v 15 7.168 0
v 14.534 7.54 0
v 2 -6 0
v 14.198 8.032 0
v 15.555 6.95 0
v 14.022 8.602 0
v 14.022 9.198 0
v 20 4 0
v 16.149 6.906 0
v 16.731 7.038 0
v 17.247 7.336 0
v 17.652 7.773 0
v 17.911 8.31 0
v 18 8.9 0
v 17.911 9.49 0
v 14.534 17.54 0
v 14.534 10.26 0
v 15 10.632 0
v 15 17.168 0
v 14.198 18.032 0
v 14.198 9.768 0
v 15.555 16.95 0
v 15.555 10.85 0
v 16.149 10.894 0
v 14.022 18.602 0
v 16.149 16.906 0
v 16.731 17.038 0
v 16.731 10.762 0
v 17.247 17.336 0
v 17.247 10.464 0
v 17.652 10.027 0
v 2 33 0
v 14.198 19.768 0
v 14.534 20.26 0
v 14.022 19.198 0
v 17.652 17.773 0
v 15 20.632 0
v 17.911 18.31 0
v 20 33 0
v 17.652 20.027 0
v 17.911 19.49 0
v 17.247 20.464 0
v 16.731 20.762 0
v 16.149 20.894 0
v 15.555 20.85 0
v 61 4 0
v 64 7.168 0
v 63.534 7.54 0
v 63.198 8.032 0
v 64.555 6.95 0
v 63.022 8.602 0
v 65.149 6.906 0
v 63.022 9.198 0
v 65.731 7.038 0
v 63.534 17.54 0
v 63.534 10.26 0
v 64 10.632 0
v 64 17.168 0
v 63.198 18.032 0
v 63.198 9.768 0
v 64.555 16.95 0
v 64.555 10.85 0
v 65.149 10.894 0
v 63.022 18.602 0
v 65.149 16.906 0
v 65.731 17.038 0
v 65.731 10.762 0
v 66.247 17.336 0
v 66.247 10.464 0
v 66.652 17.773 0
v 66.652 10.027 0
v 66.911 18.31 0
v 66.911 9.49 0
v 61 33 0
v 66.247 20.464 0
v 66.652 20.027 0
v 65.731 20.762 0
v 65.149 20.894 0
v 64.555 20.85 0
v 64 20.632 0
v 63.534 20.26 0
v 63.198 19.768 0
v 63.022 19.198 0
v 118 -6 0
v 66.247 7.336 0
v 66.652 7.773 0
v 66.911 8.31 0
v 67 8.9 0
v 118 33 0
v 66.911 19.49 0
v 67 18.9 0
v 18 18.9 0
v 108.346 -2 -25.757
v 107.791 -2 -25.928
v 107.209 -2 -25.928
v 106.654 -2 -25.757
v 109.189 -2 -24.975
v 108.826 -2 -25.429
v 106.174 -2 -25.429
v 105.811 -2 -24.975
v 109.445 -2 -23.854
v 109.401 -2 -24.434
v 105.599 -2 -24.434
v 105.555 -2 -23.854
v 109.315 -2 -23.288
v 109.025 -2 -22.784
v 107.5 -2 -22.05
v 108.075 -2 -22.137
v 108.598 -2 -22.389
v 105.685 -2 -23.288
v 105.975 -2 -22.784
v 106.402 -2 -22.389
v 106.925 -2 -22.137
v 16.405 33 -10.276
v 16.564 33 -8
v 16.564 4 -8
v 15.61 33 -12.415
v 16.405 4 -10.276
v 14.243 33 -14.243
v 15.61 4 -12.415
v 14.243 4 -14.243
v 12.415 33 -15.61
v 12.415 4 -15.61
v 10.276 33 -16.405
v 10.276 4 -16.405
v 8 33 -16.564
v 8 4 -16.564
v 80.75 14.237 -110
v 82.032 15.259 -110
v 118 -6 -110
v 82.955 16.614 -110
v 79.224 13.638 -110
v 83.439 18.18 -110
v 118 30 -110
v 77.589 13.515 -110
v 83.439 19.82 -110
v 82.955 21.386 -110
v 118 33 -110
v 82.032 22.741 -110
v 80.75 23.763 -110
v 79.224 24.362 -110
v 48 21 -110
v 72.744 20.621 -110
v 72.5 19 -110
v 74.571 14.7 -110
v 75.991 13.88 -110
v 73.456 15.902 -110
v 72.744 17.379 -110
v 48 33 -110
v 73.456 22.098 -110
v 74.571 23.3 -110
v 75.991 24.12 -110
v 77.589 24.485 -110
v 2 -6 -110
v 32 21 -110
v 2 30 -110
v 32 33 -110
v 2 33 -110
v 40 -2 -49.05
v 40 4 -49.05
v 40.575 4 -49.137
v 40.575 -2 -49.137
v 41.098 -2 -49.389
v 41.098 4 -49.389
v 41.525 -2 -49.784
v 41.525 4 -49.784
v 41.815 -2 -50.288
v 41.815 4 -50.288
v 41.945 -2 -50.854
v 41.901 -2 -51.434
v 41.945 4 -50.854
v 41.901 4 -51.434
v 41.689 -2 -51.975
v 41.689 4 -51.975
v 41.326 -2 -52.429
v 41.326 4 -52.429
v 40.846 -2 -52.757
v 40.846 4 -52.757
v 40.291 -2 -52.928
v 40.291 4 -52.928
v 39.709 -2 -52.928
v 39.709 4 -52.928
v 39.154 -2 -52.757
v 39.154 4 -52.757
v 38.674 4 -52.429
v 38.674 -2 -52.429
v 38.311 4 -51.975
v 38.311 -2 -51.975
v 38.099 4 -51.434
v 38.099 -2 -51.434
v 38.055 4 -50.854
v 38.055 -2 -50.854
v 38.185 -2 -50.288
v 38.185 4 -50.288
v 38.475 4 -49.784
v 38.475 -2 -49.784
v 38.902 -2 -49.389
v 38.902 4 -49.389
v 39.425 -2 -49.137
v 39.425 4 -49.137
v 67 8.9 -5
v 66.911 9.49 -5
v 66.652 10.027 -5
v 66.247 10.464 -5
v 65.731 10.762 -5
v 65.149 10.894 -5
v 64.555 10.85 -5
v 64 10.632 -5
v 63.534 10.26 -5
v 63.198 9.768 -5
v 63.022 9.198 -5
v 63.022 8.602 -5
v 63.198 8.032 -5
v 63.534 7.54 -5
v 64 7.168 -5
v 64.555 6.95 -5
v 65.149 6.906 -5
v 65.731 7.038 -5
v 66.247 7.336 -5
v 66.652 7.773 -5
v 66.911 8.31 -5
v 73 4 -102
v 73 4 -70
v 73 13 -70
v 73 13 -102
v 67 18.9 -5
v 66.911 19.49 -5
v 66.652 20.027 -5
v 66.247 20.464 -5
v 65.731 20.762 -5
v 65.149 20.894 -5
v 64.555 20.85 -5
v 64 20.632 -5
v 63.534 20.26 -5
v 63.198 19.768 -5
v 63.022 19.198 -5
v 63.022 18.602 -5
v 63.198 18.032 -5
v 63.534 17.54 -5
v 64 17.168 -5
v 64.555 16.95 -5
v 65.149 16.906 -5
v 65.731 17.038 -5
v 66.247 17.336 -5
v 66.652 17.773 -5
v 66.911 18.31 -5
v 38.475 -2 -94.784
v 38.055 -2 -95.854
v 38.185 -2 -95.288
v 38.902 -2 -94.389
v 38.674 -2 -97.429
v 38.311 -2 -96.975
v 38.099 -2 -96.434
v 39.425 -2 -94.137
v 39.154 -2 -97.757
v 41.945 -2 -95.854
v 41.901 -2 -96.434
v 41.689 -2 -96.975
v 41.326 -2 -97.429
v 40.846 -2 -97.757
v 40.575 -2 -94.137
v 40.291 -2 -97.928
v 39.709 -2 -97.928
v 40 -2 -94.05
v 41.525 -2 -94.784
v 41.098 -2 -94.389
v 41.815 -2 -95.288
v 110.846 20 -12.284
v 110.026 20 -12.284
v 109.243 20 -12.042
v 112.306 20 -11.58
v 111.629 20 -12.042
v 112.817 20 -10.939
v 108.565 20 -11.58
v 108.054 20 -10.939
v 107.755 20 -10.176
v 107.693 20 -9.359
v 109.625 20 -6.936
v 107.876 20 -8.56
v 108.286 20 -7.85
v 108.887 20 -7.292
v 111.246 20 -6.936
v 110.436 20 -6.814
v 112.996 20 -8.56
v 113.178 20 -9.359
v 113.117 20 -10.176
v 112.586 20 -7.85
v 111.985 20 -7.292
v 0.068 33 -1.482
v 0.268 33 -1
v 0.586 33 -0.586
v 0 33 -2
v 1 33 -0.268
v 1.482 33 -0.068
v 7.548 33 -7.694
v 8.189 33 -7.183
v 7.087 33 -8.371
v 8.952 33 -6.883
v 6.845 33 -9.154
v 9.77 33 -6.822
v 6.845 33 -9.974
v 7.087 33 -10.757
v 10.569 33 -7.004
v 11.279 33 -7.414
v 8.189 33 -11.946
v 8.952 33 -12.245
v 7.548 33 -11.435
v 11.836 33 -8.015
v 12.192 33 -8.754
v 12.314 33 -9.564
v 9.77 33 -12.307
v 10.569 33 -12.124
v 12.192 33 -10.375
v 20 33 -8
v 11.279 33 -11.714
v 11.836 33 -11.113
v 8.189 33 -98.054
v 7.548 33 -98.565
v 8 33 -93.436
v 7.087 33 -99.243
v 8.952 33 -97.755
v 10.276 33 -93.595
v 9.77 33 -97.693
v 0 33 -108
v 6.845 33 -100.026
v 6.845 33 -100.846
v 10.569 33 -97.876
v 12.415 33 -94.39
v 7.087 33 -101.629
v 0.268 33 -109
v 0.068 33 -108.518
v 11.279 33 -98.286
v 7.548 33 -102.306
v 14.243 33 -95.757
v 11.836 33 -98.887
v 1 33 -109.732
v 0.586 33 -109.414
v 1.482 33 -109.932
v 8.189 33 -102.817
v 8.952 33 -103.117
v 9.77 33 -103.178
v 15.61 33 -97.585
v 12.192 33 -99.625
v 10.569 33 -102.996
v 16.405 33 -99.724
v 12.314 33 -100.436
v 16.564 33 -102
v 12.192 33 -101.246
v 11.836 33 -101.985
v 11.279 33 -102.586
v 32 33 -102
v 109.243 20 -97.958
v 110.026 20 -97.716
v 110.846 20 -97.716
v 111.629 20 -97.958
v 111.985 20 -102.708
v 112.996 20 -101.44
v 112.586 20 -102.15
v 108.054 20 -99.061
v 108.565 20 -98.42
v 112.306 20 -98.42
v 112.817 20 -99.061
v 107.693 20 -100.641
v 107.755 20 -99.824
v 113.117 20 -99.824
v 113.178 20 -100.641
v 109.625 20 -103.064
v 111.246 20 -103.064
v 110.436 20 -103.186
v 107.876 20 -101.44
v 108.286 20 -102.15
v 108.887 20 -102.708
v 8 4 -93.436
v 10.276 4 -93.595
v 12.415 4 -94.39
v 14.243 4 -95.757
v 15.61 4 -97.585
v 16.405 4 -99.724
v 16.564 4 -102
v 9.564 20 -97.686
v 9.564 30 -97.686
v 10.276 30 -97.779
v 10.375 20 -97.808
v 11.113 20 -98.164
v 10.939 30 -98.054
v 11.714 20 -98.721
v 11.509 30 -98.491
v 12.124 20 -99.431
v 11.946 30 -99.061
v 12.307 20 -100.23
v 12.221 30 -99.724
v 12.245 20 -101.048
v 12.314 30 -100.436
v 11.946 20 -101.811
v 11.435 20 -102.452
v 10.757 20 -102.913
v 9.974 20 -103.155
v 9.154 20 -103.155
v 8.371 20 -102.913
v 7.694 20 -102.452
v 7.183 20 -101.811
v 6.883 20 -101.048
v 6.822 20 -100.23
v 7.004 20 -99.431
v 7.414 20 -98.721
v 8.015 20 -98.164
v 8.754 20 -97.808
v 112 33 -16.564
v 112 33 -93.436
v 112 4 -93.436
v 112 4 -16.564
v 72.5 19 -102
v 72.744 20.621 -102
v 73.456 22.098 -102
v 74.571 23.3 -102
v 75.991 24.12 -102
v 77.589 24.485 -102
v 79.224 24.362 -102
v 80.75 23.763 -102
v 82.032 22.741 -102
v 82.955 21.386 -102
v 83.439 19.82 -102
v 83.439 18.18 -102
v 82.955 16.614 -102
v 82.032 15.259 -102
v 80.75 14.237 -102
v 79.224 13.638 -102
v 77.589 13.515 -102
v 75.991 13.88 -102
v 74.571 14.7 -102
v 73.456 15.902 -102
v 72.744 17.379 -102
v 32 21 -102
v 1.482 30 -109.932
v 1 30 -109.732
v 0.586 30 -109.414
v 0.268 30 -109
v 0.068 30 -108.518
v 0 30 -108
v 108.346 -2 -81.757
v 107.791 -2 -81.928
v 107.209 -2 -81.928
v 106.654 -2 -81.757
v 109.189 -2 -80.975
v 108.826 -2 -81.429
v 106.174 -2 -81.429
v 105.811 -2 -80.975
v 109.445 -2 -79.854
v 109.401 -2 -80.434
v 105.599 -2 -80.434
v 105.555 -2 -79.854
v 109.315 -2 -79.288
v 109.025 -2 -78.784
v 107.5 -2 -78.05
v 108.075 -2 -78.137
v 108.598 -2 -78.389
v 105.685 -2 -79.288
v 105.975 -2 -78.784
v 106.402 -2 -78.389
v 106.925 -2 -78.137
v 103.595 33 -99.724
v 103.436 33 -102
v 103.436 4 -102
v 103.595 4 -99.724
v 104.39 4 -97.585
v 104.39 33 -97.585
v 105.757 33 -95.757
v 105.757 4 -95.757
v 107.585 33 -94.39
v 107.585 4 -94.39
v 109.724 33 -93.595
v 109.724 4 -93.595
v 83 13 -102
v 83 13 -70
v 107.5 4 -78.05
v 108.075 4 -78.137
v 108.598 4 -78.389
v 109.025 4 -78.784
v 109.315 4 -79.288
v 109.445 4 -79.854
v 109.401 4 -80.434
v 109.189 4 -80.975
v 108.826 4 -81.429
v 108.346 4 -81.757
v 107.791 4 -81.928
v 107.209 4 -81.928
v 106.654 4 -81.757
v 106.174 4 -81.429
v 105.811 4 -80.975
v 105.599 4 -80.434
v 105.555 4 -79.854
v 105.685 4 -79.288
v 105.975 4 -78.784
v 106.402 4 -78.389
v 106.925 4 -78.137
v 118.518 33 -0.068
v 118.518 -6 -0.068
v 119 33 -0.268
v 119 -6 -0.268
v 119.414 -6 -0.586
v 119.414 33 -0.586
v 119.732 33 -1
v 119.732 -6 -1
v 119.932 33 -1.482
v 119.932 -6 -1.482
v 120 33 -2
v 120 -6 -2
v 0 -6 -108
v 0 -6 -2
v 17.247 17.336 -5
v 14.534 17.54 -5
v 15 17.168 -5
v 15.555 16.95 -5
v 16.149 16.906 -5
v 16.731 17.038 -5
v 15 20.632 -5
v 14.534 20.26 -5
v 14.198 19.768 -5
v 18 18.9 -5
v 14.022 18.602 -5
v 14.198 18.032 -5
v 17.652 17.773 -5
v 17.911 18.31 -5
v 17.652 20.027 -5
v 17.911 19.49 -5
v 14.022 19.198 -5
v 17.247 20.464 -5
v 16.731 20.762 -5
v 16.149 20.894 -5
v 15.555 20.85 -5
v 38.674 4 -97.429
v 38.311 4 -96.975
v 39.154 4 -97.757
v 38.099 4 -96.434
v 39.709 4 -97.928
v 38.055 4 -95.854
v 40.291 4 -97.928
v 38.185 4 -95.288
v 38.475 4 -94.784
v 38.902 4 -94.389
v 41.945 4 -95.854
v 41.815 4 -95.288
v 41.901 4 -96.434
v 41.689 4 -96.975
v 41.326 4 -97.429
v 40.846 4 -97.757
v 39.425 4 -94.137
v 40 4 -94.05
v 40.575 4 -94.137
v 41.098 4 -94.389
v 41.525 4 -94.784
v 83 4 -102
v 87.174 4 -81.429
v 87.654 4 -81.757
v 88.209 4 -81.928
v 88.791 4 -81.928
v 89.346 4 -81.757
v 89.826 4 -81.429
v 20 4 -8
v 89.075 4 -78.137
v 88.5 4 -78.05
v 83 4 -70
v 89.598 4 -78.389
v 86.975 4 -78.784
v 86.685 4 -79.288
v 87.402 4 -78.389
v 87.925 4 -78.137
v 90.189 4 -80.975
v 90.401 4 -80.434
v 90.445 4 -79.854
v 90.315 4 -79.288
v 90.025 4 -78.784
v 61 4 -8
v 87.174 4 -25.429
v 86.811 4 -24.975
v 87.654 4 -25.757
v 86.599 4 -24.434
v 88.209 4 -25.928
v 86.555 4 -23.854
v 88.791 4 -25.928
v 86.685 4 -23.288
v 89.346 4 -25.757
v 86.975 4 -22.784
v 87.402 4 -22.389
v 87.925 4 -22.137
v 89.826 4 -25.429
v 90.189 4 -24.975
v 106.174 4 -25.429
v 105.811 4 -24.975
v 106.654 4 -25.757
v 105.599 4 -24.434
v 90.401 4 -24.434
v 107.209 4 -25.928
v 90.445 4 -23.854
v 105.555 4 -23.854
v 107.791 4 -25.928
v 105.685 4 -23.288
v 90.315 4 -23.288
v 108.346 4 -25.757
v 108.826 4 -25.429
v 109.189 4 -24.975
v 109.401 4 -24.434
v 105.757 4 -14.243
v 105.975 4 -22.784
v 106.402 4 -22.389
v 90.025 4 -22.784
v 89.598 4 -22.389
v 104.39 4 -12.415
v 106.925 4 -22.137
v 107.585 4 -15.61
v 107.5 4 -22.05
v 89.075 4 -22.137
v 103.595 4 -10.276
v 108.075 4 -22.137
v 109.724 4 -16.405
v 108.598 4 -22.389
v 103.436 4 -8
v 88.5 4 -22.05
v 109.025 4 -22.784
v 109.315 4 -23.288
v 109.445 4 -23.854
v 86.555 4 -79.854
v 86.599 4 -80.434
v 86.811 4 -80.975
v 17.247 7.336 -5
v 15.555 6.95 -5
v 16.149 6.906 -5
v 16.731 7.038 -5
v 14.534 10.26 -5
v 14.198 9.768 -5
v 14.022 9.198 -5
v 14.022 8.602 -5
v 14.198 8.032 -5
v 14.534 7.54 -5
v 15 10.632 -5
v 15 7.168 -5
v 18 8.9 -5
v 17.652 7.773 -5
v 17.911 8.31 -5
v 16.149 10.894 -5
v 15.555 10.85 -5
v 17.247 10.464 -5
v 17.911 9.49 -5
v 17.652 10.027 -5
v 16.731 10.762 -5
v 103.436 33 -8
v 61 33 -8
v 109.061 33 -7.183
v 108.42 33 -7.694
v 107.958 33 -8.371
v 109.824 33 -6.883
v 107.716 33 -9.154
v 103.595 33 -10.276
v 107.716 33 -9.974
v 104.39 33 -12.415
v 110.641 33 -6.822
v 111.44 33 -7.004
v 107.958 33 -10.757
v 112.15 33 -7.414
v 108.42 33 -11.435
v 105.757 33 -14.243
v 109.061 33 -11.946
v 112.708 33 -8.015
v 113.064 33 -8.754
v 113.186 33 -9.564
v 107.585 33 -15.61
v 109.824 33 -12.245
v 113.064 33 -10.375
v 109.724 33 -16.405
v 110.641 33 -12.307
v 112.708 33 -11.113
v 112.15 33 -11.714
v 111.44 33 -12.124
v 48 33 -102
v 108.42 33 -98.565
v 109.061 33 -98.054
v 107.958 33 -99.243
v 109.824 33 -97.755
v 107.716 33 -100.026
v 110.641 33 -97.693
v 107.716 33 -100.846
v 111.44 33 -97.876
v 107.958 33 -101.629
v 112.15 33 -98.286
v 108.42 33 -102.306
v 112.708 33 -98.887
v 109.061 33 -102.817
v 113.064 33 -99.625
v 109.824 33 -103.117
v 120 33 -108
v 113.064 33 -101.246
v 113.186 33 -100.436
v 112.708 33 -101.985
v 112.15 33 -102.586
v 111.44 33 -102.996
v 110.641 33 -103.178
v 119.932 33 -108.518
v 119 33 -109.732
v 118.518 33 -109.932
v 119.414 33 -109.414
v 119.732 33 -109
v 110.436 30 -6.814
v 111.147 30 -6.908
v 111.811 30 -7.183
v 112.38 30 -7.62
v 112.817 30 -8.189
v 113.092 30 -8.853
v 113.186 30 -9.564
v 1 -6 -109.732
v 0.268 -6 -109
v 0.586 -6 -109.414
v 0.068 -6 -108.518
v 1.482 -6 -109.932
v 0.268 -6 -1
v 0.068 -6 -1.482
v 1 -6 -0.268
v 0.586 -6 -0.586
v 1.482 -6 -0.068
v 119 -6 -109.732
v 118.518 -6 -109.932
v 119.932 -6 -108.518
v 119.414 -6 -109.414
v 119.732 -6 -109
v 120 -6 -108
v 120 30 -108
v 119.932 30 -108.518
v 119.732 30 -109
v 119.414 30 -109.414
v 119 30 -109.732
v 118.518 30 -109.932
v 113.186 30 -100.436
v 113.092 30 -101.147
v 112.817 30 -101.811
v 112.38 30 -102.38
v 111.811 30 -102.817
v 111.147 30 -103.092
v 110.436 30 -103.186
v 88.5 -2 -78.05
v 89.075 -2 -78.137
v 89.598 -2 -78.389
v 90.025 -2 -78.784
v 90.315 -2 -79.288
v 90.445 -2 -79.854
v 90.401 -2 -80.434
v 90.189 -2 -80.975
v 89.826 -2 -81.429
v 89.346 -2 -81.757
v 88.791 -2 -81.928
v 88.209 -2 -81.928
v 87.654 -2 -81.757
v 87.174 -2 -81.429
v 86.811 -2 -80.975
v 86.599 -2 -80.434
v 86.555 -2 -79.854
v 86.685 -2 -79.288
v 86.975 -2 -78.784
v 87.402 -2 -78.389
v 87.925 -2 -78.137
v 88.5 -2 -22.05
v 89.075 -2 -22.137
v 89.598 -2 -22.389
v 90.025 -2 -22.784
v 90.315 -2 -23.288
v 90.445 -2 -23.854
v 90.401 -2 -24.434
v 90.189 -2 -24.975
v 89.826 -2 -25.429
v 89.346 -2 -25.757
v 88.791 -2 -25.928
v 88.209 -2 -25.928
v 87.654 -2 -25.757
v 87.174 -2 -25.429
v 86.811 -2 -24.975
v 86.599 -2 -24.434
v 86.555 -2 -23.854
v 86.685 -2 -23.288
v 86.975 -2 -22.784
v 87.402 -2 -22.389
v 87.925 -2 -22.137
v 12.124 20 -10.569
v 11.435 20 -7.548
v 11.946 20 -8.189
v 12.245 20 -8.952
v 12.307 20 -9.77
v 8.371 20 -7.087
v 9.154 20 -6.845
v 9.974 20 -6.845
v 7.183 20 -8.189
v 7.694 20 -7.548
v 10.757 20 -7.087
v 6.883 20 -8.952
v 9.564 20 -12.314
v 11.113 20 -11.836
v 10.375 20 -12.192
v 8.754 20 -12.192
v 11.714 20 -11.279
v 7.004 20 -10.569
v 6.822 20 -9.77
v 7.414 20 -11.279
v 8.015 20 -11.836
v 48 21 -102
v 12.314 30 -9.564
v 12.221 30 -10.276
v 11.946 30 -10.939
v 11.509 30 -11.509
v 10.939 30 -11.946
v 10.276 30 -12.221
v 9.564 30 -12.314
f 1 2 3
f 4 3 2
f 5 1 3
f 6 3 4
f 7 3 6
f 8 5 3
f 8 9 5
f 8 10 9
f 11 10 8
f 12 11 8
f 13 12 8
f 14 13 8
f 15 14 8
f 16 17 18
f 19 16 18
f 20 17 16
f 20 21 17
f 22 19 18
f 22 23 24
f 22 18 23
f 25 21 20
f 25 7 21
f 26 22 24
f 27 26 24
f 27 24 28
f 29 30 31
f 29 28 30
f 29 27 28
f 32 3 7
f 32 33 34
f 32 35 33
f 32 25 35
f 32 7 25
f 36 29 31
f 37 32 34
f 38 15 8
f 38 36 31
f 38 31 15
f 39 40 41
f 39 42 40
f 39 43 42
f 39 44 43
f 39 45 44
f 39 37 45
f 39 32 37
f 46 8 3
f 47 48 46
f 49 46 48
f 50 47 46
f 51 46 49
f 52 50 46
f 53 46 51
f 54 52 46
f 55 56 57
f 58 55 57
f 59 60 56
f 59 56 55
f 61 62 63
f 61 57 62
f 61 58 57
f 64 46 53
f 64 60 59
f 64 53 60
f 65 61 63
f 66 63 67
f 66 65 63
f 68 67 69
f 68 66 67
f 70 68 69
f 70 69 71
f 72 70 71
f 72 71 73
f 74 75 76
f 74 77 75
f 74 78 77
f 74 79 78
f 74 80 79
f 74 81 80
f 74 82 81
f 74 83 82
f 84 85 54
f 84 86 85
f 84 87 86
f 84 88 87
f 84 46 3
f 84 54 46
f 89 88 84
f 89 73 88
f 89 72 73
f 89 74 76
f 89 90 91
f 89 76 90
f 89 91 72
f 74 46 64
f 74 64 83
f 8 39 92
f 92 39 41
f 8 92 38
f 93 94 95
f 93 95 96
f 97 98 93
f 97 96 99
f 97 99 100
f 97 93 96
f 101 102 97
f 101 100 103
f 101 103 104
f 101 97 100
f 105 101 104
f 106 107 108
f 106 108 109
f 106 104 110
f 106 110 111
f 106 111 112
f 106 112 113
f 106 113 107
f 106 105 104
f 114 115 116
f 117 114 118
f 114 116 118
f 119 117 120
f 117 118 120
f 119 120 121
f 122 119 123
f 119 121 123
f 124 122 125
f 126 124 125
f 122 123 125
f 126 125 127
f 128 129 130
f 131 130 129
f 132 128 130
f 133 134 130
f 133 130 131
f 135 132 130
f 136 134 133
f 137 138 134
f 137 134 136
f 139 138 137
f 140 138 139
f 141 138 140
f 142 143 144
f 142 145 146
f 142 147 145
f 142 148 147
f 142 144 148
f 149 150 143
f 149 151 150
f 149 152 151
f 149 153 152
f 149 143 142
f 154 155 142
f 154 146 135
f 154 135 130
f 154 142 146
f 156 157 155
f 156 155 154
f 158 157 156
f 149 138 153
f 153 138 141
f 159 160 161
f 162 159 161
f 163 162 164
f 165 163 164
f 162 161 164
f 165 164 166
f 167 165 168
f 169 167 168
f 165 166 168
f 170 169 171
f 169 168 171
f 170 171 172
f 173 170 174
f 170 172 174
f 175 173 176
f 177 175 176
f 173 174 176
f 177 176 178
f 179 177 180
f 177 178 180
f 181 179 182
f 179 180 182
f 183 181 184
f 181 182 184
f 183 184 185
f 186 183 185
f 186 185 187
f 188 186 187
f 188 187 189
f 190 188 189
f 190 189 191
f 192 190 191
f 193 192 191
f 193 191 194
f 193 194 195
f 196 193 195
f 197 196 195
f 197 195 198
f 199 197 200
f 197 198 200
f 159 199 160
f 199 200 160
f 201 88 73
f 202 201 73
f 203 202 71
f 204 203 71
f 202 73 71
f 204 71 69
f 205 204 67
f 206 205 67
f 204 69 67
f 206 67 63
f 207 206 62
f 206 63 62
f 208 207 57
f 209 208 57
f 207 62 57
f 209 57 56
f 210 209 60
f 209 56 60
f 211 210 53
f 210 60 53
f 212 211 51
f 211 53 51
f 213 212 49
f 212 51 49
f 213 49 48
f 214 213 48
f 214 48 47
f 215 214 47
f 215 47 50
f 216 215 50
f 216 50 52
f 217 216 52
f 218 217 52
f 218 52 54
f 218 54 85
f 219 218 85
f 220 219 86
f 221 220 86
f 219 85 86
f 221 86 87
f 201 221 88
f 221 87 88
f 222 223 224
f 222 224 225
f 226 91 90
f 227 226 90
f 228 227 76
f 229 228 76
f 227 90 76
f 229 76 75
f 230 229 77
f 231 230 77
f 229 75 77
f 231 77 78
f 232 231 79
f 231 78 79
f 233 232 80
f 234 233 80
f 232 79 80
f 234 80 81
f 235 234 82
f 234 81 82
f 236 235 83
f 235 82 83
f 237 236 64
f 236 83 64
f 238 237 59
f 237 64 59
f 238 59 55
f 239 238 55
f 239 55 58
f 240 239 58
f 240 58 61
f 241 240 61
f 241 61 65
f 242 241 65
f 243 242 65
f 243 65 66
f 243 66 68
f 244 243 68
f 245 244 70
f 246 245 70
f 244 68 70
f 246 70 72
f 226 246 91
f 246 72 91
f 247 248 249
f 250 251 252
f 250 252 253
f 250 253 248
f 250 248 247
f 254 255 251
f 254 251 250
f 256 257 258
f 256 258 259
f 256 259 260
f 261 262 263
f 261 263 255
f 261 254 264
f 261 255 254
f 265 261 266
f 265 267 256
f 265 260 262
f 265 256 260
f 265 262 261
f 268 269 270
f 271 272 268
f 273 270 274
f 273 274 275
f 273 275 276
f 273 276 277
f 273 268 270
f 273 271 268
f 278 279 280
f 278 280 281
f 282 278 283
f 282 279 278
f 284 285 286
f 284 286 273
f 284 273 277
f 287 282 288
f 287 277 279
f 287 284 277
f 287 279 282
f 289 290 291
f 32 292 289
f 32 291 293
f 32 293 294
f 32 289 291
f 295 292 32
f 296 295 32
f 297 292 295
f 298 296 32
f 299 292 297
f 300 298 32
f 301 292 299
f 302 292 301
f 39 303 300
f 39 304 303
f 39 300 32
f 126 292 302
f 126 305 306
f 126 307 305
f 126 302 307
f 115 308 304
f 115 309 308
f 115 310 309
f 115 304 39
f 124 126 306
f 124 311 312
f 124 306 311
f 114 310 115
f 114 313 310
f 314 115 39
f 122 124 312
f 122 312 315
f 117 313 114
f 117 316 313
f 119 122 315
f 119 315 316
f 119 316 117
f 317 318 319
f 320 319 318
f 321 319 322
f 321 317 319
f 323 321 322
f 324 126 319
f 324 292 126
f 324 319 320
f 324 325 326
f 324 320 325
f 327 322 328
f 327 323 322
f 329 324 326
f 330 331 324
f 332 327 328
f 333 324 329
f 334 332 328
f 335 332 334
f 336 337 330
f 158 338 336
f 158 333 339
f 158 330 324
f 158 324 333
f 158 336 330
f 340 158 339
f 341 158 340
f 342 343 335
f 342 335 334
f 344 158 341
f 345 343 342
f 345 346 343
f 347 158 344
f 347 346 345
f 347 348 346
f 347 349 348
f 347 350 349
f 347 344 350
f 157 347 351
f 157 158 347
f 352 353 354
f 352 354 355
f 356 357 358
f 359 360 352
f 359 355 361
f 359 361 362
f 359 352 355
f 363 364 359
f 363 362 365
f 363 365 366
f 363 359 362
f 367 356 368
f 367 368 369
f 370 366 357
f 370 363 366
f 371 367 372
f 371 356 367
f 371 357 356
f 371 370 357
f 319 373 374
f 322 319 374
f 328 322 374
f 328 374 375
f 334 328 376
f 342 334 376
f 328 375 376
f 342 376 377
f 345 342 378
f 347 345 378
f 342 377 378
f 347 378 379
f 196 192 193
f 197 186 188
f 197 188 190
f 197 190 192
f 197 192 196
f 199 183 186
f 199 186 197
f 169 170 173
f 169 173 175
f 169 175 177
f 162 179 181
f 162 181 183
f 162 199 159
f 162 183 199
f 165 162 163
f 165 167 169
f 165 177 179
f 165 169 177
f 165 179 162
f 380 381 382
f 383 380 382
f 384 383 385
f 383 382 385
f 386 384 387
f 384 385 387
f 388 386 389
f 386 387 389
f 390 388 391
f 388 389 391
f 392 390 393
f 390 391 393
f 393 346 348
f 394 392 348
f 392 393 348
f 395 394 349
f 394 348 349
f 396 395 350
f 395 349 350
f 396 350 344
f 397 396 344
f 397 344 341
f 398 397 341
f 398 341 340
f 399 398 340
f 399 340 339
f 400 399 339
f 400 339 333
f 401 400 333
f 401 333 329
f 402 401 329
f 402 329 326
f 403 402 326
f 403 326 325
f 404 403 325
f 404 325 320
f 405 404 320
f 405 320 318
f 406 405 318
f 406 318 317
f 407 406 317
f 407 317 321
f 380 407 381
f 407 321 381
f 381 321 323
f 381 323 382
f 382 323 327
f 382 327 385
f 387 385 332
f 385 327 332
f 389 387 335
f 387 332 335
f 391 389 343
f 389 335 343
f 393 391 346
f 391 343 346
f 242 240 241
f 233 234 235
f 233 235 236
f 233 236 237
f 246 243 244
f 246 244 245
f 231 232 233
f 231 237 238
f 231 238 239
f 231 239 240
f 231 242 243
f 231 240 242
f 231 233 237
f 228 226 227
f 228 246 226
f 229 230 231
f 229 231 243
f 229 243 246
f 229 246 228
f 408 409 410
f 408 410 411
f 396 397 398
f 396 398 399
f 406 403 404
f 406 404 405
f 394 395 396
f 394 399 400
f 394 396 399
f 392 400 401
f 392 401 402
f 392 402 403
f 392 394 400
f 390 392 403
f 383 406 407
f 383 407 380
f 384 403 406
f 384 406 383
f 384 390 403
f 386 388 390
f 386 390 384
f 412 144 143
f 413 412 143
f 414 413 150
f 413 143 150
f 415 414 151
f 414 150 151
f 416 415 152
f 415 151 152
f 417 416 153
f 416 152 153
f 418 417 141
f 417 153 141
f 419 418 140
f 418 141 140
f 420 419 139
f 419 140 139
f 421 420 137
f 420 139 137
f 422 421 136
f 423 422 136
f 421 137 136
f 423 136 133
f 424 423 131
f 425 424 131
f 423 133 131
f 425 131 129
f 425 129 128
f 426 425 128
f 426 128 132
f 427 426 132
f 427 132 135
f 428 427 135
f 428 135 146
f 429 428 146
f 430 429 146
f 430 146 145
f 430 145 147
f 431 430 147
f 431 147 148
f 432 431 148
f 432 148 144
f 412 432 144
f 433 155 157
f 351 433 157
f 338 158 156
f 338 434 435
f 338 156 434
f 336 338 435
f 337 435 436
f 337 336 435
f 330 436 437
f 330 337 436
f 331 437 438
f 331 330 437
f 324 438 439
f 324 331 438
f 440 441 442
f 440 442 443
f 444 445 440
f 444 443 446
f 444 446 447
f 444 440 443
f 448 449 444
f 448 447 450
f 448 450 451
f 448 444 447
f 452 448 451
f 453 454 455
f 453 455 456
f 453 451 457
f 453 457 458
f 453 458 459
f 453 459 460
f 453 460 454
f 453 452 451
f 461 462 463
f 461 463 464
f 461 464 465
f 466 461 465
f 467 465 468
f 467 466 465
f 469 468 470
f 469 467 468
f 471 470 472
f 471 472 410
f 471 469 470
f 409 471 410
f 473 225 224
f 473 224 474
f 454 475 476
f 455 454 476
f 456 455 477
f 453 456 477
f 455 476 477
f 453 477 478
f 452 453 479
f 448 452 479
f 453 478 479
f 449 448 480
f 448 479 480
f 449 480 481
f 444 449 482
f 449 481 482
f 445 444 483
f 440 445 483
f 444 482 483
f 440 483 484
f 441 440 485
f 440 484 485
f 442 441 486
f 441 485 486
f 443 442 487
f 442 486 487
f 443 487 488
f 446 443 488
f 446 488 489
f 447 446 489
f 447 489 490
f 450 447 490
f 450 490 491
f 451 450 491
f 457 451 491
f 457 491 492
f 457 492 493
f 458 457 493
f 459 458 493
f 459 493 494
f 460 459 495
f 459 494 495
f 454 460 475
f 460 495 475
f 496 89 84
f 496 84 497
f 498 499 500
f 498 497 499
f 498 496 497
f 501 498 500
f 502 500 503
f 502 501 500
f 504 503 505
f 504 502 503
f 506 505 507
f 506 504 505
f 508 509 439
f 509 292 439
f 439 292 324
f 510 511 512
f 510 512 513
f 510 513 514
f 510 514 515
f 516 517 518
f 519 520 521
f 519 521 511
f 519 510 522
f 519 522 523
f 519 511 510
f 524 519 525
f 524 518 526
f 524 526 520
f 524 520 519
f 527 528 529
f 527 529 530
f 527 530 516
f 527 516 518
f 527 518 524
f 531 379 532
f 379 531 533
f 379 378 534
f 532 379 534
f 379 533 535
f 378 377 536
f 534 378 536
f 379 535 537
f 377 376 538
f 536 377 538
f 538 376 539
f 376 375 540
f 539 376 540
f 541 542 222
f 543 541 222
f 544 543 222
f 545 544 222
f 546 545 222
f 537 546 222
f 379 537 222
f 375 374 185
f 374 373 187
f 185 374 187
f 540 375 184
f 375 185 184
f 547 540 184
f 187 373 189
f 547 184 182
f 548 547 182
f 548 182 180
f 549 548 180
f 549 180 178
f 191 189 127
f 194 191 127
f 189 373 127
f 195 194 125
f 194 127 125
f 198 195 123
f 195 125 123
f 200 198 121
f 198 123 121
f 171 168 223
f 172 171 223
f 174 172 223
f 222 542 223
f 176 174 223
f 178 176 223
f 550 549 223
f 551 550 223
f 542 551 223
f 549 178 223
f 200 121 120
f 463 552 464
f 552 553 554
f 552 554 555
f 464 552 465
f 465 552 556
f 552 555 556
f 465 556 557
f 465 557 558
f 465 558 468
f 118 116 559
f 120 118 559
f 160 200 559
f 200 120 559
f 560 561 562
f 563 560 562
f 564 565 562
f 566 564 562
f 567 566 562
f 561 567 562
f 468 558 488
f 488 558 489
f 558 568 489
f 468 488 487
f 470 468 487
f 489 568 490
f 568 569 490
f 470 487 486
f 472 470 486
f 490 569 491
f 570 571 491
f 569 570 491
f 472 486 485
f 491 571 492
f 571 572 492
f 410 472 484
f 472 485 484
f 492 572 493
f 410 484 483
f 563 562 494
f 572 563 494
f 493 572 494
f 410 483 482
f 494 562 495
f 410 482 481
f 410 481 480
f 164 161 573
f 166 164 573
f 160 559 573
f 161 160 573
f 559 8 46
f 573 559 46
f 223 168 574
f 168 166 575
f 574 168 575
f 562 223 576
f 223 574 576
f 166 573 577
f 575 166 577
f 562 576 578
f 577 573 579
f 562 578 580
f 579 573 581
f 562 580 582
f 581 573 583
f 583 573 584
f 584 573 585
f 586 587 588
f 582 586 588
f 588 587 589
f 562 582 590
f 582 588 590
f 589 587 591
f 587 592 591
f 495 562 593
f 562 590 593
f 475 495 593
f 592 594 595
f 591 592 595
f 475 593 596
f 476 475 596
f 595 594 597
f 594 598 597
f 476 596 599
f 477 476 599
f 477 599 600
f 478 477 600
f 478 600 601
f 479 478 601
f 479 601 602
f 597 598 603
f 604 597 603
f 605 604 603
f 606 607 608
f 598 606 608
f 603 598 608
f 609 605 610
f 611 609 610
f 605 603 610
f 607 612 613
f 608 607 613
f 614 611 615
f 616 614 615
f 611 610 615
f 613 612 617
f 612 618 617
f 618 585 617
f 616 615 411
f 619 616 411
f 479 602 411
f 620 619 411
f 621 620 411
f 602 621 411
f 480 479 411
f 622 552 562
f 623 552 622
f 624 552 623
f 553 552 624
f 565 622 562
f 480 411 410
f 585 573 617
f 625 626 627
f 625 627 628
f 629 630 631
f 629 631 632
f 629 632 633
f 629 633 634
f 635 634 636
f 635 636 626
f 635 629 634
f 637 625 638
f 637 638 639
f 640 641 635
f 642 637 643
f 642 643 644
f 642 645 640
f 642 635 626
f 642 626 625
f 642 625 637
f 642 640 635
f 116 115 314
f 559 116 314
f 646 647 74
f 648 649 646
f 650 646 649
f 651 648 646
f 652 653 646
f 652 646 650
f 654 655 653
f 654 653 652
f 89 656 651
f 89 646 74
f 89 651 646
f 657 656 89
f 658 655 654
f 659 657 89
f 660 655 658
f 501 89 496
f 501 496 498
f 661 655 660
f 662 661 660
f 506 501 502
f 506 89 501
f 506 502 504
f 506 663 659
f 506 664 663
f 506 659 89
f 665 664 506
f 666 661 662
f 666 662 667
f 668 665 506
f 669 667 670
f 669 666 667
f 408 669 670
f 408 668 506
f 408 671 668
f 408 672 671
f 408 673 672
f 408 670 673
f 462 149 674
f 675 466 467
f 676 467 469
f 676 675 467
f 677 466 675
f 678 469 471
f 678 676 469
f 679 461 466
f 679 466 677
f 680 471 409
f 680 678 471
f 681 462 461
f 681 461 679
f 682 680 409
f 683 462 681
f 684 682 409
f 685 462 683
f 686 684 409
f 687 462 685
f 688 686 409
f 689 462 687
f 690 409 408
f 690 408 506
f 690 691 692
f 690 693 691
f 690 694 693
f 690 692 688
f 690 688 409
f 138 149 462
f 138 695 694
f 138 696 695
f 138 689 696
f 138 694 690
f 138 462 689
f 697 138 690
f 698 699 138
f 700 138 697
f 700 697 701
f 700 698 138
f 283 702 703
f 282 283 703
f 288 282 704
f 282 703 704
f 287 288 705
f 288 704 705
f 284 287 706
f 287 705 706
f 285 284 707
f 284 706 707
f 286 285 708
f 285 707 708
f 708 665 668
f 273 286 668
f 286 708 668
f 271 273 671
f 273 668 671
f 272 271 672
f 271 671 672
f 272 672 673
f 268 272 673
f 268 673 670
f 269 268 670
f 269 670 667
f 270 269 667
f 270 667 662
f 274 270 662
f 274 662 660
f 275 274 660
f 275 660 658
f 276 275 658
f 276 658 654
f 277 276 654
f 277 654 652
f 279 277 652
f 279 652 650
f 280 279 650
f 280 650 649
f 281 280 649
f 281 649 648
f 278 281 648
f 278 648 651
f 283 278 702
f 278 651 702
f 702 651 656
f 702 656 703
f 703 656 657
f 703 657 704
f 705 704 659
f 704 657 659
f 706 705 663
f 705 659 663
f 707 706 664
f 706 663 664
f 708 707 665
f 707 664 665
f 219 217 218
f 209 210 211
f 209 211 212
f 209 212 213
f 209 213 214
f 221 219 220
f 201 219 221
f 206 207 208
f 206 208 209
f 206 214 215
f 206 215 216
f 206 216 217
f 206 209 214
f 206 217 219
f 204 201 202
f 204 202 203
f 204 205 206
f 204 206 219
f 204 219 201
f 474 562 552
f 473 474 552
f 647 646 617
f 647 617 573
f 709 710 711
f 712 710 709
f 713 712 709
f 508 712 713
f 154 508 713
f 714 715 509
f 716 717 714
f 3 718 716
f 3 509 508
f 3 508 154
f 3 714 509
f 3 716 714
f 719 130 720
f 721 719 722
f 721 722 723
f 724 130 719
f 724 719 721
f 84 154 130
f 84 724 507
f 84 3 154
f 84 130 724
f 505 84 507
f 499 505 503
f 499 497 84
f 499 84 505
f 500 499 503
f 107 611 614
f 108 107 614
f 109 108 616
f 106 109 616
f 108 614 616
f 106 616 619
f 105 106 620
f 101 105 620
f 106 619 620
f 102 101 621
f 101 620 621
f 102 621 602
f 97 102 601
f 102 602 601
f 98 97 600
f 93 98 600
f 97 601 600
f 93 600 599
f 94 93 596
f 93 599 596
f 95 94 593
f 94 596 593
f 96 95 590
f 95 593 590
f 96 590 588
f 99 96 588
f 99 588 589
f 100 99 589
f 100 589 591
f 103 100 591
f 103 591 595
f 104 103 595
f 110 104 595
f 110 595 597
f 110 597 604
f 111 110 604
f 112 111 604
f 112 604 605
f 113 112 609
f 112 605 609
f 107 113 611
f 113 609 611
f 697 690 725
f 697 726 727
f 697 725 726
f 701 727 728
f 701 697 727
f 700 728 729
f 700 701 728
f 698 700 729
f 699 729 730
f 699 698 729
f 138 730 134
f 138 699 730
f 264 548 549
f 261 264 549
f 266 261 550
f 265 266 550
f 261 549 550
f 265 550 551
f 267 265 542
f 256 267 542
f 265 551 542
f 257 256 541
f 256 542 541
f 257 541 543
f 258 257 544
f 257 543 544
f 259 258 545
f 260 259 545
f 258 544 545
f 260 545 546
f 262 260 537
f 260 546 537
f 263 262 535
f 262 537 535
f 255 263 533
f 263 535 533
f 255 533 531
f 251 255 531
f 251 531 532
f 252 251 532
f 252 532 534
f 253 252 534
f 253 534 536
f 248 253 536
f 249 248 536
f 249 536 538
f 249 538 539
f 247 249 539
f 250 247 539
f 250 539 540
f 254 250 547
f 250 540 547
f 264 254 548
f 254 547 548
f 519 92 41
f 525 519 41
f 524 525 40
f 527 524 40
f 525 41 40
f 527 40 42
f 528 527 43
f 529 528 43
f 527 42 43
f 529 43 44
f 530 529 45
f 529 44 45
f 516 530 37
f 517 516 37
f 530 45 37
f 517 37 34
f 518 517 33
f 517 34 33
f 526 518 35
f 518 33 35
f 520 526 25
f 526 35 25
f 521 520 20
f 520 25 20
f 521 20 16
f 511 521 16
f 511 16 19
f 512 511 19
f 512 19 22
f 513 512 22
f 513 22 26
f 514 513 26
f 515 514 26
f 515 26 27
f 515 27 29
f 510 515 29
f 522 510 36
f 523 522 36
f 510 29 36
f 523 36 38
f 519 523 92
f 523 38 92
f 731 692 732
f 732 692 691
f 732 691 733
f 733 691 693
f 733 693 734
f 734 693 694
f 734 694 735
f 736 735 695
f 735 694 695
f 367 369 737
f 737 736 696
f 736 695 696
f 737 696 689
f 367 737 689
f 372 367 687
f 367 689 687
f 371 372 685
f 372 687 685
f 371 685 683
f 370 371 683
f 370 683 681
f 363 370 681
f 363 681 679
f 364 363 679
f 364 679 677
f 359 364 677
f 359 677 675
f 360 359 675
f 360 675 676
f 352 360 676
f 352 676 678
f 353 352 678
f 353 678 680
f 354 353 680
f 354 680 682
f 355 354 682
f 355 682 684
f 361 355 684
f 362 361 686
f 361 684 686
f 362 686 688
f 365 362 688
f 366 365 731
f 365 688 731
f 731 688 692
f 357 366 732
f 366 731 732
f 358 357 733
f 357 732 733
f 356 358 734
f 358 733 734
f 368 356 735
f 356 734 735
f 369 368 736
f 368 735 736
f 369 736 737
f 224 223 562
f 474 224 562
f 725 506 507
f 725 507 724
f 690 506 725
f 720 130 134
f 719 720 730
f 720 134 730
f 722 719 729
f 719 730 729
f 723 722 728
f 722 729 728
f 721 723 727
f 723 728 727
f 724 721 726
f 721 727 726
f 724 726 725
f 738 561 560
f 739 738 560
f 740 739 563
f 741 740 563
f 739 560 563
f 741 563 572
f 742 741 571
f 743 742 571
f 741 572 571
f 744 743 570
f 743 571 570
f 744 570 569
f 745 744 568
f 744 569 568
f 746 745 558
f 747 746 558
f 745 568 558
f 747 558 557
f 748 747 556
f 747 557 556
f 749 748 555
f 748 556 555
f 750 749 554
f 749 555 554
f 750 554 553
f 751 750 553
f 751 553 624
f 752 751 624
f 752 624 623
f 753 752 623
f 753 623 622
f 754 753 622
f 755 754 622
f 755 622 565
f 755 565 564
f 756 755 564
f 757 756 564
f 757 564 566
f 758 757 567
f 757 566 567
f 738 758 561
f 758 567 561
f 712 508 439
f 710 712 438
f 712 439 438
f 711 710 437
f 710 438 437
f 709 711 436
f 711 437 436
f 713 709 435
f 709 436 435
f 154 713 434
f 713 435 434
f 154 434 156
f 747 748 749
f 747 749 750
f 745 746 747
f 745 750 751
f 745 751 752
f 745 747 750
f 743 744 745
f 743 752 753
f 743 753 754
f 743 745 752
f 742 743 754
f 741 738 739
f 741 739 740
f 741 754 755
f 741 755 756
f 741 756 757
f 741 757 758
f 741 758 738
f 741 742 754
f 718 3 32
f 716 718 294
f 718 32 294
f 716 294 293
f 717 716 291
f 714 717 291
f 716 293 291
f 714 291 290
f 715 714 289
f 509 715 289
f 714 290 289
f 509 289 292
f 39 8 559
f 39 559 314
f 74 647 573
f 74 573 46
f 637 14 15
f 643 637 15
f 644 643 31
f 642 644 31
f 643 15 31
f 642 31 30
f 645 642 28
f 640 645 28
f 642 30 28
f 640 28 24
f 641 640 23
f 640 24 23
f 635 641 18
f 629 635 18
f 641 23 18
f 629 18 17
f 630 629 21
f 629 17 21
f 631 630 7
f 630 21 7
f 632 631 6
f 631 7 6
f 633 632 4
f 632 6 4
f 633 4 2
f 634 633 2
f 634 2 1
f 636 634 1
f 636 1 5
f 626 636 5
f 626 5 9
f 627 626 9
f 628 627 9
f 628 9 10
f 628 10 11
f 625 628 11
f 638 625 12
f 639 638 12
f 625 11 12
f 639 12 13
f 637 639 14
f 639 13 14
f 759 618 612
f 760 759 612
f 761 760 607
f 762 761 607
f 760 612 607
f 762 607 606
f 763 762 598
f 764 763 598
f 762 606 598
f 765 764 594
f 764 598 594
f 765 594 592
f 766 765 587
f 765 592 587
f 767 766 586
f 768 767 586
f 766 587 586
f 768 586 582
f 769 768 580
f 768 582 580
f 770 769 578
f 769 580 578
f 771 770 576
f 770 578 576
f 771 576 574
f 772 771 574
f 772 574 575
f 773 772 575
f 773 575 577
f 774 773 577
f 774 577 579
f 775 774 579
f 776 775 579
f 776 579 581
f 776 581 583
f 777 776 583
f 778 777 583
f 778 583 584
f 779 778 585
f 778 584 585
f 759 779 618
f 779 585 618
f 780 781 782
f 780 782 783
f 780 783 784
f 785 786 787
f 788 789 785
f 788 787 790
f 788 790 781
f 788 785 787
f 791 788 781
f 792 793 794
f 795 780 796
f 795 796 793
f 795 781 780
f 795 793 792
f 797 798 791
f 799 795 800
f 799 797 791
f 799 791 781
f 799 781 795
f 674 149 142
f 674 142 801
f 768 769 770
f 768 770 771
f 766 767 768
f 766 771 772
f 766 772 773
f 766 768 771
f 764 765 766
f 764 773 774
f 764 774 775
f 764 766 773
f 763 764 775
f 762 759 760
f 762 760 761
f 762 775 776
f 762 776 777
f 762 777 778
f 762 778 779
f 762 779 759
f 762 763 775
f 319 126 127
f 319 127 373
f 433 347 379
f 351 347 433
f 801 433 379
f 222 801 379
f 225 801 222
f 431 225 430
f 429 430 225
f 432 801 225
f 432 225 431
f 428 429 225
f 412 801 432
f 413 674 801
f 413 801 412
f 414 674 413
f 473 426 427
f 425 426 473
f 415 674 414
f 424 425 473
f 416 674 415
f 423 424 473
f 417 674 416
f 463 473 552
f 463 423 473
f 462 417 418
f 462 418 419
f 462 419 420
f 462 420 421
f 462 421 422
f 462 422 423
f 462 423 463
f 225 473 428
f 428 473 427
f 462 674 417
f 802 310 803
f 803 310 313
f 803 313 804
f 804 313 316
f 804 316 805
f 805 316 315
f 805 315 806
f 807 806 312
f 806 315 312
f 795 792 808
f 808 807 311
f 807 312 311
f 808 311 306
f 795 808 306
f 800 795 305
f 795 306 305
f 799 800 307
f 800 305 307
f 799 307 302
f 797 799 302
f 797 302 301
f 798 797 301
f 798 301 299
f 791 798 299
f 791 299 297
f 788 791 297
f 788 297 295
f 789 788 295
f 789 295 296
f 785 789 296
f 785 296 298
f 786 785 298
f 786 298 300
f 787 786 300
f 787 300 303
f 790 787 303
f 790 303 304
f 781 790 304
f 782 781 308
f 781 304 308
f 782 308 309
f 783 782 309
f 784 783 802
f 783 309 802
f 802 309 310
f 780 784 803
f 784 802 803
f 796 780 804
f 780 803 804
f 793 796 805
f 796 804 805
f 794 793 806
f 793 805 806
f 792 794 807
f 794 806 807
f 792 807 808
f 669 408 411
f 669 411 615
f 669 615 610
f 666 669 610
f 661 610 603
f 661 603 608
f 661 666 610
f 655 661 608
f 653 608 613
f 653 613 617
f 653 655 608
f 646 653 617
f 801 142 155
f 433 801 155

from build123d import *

# Parameters (mm, degrees)
SKETCH1_W           = 120
SKETCH1_H           = 110
BOSS_EXTRUDE1_DEPTH = 30
SKETCH2_W           = 104
SKETCH2_H           = 94
CUT_EXTRUDE1_DEPTH  = 26
FILLET1_R           = 2
CUT_EXTRUDE2_REACH  = 167.529
SKETCH3_W           = 41
SKETCH3_H           = 21
SKETCH5_R           = 2
CUT_EXTRUDE3_DEPTH  = 5
CUT_EXTRUDE4_REACH  = 167.529
SKETCH7_R           = 5.5
CUT_EXTRUDE5_REACH  = 167.529
SKETCH8_W           = 16
SKETCH8_H           = 9
SKETCH9_W           = 10
SKETCH9_H           = 32
BOSS_EXTRUDE2_DEPTH = 9
BOSS_EXTRUDE3_DEPTH = 26
BOSS_EXTRUDE4_DEPTH = 6
SKETCH11_R          = 1.95
CUT_EXTRUDE6_DEPTH  = 6
SKETCH13_R          = 2.75
CUT_EXTRUDE7_DEPTH  = 10
CUT_EXTRUDE8_REACH  = 167.529
SKETCH16_W          = 41
SKETCH16_H          = 5
BOSS_EXTRUDE5_START = 3
SKETCH21_R          = 2.75
BOSS_EXTRUDE5_DEPTH = 3


with BuildPart() as part:
    # Sketch1 → Boss-Extrude1 (new body)
    with BuildSketch(Plane(origin=(0, 0, 0), x_dir=(1, 0, 0), z_dir=(0, 1, 0))):
        with Locations((60, 55)):
            Rectangle(SKETCH1_W, SKETCH1_H)
    extrude(amount=BOSS_EXTRUDE1_DEPTH)

    # Sketch2 → Cut-Extrude1 (cut)
    with BuildSketch(Plane(origin=(0, 30, 0), x_dir=(1, 0, 0), z_dir=(0, 1, 0))):
        with Locations((60, 55)):
            Rectangle(SKETCH2_W, SKETCH2_H)
    extrude(amount=-CUT_EXTRUDE1_DEPTH, mode=Mode.SUBTRACT)

    # Fillet1
    fillet1_edges = [part.edges().sort_by_distance(p)[0] for p in [
        (112, 17, -8),
        (8, 17, -8),
        (8, 17, -102),
        (112, 17, -102),
        (0, 15, -110),
        (120, 15, -110),
        (120, 15, 0),
        (0, 15, 0),
    ]]
    fillet(fillet1_edges, radius=FILLET1_R)

    # Sketch3 → Cut-Extrude2 (cut, up to next)
    with BuildSketch(Plane.XY, mode=Mode.PRIVATE) as cut_extrude2_sk1:
        with Locations((40.5, 14.5)):
            Rectangle(SKETCH3_W, SKETCH3_H)
    cut_extrude2_tool1 = extrude(cut_extrude2_sk1.sketch, amount=-CUT_EXTRUDE2_REACH, mode=Mode.PRIVATE) & part.part
    add(cut_extrude2_tool1.solids().sort_by_distance((40.5, 14.5, 0))[0], mode=Mode.SUBTRACT)

    # Sketch5 → Cut-Extrude3 (cut)
    with BuildSketch(Plane.XY):
        with Locations((65, 8.9)):
            Circle(SKETCH5_R)
        with Locations((16, 18.9)):
            Circle(SKETCH5_R)
        with Locations((16, 8.9)):
            Circle(SKETCH5_R)
        with Locations((65, 18.9)):
            Circle(SKETCH5_R)
    extrude(amount=-CUT_EXTRUDE3_DEPTH, mode=Mode.SUBTRACT)

    # Sketch7 → Cut-Extrude4 (cut, up to next)
    with BuildSketch(Plane(origin=(0, 0, -110), x_dir=(-1, 0, 0), z_dir=(0, 0, -1)), mode=Mode.PRIVATE) as cut_extrude4_sk1:
        with Locations((-78, 19)):
            Circle(SKETCH7_R)
    cut_extrude4_tool1 = extrude(cut_extrude4_sk1.sketch, amount=-CUT_EXTRUDE4_REACH, mode=Mode.PRIVATE) & part.part
    add(cut_extrude4_tool1.solids().sort_by_distance((78, 19, -110))[0], mode=Mode.SUBTRACT)

    # Sketch8 → Cut-Extrude5 (cut, up to next)
    with BuildSketch(Plane(origin=(0, 0, -110), x_dir=(-1, 0, 0), z_dir=(0, 0, -1)), mode=Mode.PRIVATE) as cut_extrude5_sk1:
        with Locations((-40, 25.5)):
            Rectangle(SKETCH8_W, SKETCH8_H)
    cut_extrude5_tool1 = extrude(cut_extrude5_sk1.sketch, amount=-CUT_EXTRUDE5_REACH, mode=Mode.PRIVATE) & part.part
    add(cut_extrude5_tool1.solids().sort_by_distance((40, 25.5, -110))[0], mode=Mode.SUBTRACT)

    # Sketch9 → Boss-Extrude2 (add)
    with BuildSketch(Plane(origin=(0, 4, 0), x_dir=(1, 0, 0), z_dir=(0, 1, 0))):
        with Locations((78, 86)):
            Rectangle(SKETCH9_W, SKETCH9_H)
    extrude(amount=BOSS_EXTRUDE2_DEPTH)

    # Sketch10 → Boss-Extrude3 (add)
    with BuildSketch(Plane(origin=(0, 4, 0), x_dir=(1, 0, 0), z_dir=(0, 1, 0))):
        with BuildLine():
            ThreePointArc((10, 102), (8.585786438, 101.414213562), (8, 100))
            Line((8, 100), (8, 93.435688996))
            ThreePointArc((8, 93.435688996), (14.242640687, 95.757359313), (16.564311004, 102))
            Line((16.564311004, 102), (10, 102))
        make_face()
        with BuildLine():
            ThreePointArc((8, 10), (8.585786438, 8.585786438), (10, 8))
            Line((10, 8), (16.564311004, 8))
            ThreePointArc((16.564311004, 8), (14.242640687, 14.242640687), (8, 16.564311004))
            Line((8, 16.564311004), (8, 10))
        make_face()
        with BuildLine():
            ThreePointArc((110, 8), (111.414213562, 8.585786438), (112, 10))
            Line((112, 10), (112, 16.564311004))
            ThreePointArc((112, 16.564311004), (105.757359313, 14.242640687), (103.435688996, 8))
            Line((103.435688996, 8), (110, 8))
        make_face()
        with BuildLine():
            ThreePointArc((112, 100), (111.414213562, 101.414213562), (110, 102))
            Line((110, 102), (103.435688996, 102))
            ThreePointArc((103.435688996, 102), (105.757359313, 95.757359313), (112, 93.435688996))
            Line((112, 93.435688996), (112, 100))
        make_face()
    extrude(amount=BOSS_EXTRUDE3_DEPTH)

    # Sketch12 → Boss-Extrude4 (add)
    with BuildSketch(Plane.XZ):
        with BuildLine():
            Line((2, -110), (118, -110))
            ThreePointArc((118, -110), (119.414213562, -109.414213562), (120, -108))
            Line((120, -108), (120, -2))
            ThreePointArc((120, -2), (119.414213562, -0.585786438), (118, 0))
            Line((118, 0), (2, 0))
            ThreePointArc((2, 0), (0.585786438, -0.585786438), (0, -2))
            Line((0, -2), (0, -108))
            ThreePointArc((0, -108), (0.585786438, -109.414213562), (2, -110))
        make_face()
    extrude(amount=BOSS_EXTRUDE4_DEPTH)

    # Sketch11 → Cut-Extrude6 (cut)
    with BuildSketch(Plane(origin=(0, 4, 0), x_dir=(1, 0, 0), z_dir=(0, 1, 0))):
        with Locations(Location((40, 96, 0), (0, 0, 270))):
            Circle(SKETCH11_R)
        with Locations(Location((40, 51, 0), (0, 0, 270))):
            Circle(SKETCH11_R)
        with Locations(Location((88.5, 80, 0), (0, 0, 270))):
            Circle(SKETCH11_R)
        with Locations(Location((107.5, 80, 0), (0, 0, 270))):
            Circle(SKETCH11_R)
        with Locations(Location((88.5, 24, 0), (0, 0, 270))):
            Circle(SKETCH11_R)
        with Locations(Location((107.5, 24, 0), (0, 0, 270))):
            Circle(SKETCH11_R)
    extrude(amount=-CUT_EXTRUDE6_DEPTH, mode=Mode.SUBTRACT)

    # Sketch13 → Cut-Extrude7 (cut)
    with BuildSketch(Plane(origin=(0, 30, 0), x_dir=(1, 0, 0), z_dir=(0, 1, 0))):
        with Locations(Location((110.435688996, 100.435688996, 0), (0, 0, 90))):
            Circle(SKETCH13_R)
        with Locations(Location((9.564311004, 100.435688996, 0), (0, 0, 270))):
            Circle(SKETCH13_R)
        with Locations(Location((110.435688996, 9.564311004, 0), (0, 0, 270))):
            Circle(SKETCH13_R)
        with Locations(Location((9.564311004, 9.564311004, 0), (0, 0, 90))):
            Circle(SKETCH13_R)
    extrude(amount=-CUT_EXTRUDE7_DEPTH, mode=Mode.SUBTRACT)

    # Sketch16 → Cut-Extrude8 (cut, up to next)
    with BuildSketch(Plane.XY, mode=Mode.PRIVATE) as cut_extrude8_sk1:
        with Locations((40.5, 27.5)):
            Rectangle(SKETCH16_W, SKETCH16_H)
    cut_extrude8_tool1 = extrude(cut_extrude8_sk1.sketch, amount=-CUT_EXTRUDE8_REACH, mode=Mode.PRIVATE) & part.part
    add(cut_extrude8_tool1.solids().sort_by_distance((40.5, 27.5, 0))[0], mode=Mode.SUBTRACT)

    # Sketch21 → Boss-Extrude5 (add)
    # profile 1 of 2: a face of its own
    with BuildSketch(Plane(origin=(0, 30, 0), x_dir=(1, 0, 0), z_dir=(0, 1, 0)).offset(BOSS_EXTRUDE5_START)):
        with BuildLine():
            ThreePointArc((112, 16.564311004), (105.757359313, 14.242640687), (103.435688996, 8))
            Line((103.435688996, 8), (61, 8))
            Line((61, 8), (61, 0))
            Line((61, 0), (118, 0))
            ThreePointArc((118, 0), (119.414213562, 0.585786438), (120, 2))
            Line((120, 2), (120, 108))
            ThreePointArc((120, 108), (119.414213562, 109.414213562), (118, 110))
            Line((118, 110), (48, 110))
            Line((48, 110), (48, 102))
            Line((48, 102), (103.435688996, 102))
            ThreePointArc((103.435688996, 102), (105.757359313, 95.757359313), (112, 93.435688996))
            Line((112, 93.435688996), (112, 16.564311004))
        make_face()
        with Locations((110.435688996, 9.564311004)):
            Circle(SKETCH21_R, mode=Mode.SUBTRACT)
        with Locations((110.435688996, 100.435688996)):
            Circle(SKETCH21_R, mode=Mode.SUBTRACT)
    # profile 2 of 2: a face of its own
    with BuildSketch(Plane(origin=(0, 30, 0), x_dir=(1, 0, 0), z_dir=(0, 1, 0)).offset(BOSS_EXTRUDE5_START)):
        with BuildLine():
            Line((8, 16.564311004), (8, 93.435688996))
            ThreePointArc((8, 93.435688996), (14.242640687, 95.757359313), (16.564311004, 102))
            Line((16.564311004, 102), (32, 102))
            Line((32, 102), (32, 110))
            Line((32, 110), (2, 110))
            ThreePointArc((2, 110), (0.585786438, 109.414213562), (0, 108))
            Line((0, 108), (0, 2))
            ThreePointArc((0, 2), (0.585786438, 0.585786438), (2, 0))
            Line((2, 0), (20, 0))
            Line((20, 0), (20, 8))
            Line((20, 8), (16.564311004, 8))
            ThreePointArc((16.564311004, 8), (14.242640687, 14.242640687), (8, 16.564311004))
        make_face()
        with Locations((9.564311004, 9.564311004)):
            Circle(SKETCH21_R, mode=Mode.SUBTRACT)
        with Locations((9.564311004, 100.435688996)):
            Circle(SKETCH21_R, mode=Mode.SUBTRACT)
    extrude(amount=-BOSS_EXTRUDE5_DEPTH)


solid = part.part
